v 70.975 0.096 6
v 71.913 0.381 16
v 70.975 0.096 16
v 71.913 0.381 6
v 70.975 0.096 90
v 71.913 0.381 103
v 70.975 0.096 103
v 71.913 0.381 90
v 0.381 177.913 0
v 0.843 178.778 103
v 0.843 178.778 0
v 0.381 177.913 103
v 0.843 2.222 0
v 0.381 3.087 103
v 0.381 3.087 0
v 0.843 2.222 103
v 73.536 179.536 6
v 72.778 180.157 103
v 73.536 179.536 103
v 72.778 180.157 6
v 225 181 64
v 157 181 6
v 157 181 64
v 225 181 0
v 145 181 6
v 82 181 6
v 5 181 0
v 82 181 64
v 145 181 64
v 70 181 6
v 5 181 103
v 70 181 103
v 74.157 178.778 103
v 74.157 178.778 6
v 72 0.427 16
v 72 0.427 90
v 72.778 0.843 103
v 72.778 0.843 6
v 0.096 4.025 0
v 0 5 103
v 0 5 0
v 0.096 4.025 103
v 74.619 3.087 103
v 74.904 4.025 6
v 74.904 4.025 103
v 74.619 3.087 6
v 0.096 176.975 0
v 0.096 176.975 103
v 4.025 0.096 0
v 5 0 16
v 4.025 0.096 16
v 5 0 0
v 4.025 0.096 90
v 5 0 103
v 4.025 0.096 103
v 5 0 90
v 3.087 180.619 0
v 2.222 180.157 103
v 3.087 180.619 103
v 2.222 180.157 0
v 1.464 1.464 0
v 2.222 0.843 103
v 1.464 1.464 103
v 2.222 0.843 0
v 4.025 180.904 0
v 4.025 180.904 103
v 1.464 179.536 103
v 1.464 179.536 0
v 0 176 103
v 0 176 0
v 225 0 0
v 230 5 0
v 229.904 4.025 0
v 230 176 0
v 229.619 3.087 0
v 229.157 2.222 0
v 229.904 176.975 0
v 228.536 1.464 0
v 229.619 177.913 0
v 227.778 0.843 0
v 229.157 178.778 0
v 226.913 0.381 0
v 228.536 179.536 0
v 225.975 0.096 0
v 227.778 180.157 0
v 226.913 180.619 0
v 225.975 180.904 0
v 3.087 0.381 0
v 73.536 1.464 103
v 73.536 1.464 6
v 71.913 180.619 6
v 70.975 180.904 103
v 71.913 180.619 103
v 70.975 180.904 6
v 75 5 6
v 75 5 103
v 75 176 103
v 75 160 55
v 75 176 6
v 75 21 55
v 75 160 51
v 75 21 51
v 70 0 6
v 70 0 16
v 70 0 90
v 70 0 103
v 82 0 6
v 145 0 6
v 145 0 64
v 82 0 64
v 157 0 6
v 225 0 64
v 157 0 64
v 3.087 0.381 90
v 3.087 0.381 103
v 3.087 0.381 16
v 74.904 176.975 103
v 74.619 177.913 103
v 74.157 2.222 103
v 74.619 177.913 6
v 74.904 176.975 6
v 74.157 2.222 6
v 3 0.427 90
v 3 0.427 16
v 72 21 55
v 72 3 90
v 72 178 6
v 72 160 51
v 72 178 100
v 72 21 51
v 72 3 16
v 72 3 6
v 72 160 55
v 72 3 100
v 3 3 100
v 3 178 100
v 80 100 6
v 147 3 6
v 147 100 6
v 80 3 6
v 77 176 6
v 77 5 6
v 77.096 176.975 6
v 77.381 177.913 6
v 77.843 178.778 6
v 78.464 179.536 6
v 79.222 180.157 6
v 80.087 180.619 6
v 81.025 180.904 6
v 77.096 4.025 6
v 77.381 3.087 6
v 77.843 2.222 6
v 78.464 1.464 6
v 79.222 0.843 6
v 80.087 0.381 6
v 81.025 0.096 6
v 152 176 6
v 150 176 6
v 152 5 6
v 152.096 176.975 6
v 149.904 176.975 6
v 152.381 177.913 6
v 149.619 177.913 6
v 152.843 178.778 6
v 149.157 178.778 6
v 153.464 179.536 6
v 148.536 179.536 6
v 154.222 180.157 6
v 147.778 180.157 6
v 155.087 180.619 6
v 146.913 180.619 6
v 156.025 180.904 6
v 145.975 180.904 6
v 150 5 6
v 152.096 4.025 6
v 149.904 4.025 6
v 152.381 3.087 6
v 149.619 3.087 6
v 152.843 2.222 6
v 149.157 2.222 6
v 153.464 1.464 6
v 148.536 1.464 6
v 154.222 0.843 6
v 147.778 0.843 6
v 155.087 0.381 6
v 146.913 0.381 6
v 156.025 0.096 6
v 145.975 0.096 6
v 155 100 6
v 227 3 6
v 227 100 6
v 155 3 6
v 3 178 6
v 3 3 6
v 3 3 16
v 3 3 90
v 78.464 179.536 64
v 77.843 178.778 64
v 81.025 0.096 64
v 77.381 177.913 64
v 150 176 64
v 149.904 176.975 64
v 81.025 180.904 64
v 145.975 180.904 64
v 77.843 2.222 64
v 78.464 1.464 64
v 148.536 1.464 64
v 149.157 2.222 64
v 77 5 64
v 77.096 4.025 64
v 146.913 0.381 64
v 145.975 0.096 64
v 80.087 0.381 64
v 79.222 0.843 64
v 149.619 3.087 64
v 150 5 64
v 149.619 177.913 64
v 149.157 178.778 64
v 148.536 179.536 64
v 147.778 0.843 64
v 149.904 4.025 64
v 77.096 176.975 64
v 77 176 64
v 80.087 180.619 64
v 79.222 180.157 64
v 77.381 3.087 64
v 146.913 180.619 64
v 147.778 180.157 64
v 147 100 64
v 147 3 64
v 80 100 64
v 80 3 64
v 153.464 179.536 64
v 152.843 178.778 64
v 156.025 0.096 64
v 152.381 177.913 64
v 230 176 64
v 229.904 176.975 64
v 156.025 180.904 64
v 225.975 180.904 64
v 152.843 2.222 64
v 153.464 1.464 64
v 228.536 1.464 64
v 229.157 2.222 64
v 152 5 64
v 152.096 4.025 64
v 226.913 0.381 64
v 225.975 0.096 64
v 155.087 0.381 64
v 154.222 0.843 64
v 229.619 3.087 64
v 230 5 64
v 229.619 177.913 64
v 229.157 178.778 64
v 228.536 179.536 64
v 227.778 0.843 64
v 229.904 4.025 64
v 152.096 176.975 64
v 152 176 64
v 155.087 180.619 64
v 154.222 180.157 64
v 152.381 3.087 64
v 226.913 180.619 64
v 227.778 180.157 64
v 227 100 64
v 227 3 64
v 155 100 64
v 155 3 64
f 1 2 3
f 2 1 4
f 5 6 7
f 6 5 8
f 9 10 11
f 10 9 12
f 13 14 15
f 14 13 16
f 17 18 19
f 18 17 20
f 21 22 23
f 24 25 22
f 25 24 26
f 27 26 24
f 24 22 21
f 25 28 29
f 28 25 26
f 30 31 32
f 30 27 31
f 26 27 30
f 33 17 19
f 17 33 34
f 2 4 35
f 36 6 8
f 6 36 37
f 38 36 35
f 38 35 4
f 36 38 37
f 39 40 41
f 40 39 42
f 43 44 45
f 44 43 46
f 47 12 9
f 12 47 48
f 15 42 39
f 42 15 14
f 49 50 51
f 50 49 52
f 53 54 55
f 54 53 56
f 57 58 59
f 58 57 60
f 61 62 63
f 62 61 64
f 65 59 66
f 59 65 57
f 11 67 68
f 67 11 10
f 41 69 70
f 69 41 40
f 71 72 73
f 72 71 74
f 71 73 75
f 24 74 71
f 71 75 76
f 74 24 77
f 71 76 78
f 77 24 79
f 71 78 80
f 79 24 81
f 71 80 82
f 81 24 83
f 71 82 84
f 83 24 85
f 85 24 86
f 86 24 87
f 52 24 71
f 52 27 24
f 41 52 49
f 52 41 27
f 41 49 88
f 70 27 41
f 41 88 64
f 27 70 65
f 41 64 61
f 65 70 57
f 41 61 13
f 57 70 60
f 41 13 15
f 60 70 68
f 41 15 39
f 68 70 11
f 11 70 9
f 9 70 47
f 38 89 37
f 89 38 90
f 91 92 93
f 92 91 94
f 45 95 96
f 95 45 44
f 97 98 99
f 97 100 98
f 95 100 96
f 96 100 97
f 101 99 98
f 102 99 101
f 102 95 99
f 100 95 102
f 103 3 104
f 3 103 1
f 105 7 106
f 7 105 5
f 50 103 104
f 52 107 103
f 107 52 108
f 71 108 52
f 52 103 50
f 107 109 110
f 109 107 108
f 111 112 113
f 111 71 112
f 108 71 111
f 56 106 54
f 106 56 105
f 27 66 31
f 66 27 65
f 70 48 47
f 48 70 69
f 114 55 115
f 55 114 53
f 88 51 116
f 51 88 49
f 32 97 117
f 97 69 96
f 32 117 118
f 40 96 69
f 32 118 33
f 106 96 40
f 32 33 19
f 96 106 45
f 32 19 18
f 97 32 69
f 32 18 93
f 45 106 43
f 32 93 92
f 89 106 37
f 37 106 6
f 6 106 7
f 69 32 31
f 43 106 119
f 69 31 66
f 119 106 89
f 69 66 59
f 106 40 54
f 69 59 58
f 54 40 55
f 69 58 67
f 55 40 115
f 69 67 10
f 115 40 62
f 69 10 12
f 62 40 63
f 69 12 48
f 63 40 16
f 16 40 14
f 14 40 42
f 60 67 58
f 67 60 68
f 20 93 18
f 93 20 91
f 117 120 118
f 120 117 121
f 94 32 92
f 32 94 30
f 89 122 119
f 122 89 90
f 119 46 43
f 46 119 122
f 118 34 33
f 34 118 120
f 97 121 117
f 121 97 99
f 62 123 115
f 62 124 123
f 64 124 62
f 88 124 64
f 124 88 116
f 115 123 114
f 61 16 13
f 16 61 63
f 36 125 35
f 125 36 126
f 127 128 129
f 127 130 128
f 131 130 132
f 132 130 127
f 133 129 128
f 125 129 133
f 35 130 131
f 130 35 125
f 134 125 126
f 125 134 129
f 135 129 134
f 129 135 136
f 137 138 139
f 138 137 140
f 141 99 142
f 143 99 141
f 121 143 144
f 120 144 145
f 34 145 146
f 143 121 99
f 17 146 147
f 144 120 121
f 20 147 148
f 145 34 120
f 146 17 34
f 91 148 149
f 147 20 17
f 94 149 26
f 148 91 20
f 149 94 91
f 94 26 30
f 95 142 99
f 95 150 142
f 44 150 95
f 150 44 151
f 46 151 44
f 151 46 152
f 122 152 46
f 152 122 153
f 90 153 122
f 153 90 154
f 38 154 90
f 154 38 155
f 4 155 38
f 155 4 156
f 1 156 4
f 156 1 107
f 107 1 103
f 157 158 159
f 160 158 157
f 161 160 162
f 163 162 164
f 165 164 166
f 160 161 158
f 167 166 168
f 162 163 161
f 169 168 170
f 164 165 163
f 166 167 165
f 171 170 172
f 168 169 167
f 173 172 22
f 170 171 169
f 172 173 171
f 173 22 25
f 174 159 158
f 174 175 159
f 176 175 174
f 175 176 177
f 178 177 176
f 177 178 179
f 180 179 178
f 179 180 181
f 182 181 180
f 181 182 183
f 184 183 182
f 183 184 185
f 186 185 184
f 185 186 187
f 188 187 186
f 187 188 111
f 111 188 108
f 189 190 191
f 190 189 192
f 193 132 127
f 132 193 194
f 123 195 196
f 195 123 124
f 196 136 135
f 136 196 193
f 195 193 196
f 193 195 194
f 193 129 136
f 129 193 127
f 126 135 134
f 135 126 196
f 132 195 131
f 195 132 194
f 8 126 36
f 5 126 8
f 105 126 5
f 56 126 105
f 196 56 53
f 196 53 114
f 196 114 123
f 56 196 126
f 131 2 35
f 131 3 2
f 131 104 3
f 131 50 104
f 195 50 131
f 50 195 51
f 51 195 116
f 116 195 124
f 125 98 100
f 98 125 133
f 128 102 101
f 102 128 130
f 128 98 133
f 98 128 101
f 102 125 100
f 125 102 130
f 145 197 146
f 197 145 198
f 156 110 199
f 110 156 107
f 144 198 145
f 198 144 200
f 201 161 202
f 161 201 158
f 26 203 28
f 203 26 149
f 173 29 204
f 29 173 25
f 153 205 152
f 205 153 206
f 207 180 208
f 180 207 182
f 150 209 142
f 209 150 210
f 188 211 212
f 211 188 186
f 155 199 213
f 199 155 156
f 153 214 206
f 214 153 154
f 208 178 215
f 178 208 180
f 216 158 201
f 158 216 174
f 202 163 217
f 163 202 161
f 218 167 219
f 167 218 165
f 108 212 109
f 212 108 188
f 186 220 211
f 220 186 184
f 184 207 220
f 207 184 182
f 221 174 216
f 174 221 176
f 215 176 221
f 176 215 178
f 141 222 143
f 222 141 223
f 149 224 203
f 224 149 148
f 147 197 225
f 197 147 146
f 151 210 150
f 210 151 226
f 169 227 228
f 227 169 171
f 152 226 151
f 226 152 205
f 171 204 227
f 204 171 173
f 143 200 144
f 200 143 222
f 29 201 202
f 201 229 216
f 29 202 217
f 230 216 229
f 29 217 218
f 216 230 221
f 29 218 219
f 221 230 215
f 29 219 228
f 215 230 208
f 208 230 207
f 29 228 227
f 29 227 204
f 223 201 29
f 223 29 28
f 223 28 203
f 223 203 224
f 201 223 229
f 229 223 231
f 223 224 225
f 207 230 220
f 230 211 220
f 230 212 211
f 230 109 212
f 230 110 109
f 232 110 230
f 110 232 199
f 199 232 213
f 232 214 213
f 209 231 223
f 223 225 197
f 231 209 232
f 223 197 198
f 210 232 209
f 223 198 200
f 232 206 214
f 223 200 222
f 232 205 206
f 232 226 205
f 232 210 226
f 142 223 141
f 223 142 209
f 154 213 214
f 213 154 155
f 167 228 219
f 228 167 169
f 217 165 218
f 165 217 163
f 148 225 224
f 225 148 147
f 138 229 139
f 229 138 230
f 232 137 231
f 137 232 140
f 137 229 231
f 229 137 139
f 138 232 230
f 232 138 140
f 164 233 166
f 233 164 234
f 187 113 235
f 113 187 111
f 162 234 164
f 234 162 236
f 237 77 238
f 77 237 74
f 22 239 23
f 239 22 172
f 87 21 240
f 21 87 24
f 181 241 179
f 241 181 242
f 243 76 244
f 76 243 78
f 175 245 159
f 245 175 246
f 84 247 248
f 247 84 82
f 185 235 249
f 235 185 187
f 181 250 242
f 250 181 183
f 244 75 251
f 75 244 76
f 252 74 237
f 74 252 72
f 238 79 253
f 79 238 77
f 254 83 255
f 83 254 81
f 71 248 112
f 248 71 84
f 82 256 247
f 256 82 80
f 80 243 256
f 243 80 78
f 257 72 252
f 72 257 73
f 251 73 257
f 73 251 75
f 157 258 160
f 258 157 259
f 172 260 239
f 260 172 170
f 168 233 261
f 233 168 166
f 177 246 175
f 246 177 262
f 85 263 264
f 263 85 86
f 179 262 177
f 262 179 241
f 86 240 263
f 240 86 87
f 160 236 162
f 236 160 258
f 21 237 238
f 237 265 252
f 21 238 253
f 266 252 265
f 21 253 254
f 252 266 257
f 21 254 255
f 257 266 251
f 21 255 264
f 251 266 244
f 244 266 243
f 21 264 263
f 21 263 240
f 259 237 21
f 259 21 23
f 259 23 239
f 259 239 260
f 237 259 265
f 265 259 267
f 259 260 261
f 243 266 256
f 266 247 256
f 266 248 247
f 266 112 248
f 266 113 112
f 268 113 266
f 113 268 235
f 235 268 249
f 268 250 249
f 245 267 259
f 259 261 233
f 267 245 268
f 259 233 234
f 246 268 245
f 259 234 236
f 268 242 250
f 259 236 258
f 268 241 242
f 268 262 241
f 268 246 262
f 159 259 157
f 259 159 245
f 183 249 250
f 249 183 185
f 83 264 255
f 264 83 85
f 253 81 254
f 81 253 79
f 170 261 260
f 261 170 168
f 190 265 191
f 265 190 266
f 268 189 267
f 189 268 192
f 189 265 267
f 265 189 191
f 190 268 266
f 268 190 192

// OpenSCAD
// PrimeBind Station — Pack Opening Desk Organizer v1
// Sections (left→right): Toploader Spring Magazine | Exact Fit Sleeves | Regular Sleeves
//
// KEY FEATURE: Spring-loaded toploader magazine — follower plate keeps stack
// pressed forward at all times. Grab from front, spring advances stack.
// Follower slot visible on right wall — handle travels as stack is consumed.
//
// DIMS: ~230mm wide × 181mm deep × 103mm tall
// PRINT: Standing upright on the base (floor on bed)
// FITS: K2 Plus 350×350mm bed in one piece

$fn = 32;

// ─── SHARED ────────────────────────────────────────────────────
wall    = 3.0;
r_edge  = 5.0;
base_h  = 6.0;
sep     = 2.0;   // gap between sections (modular aesthetic)

// ─── TOPLOADER MAGAZINE ────────────────────────────────────────
// Standard 35pt rigid toploader: 66×91mm face, ~3.2mm thick
tl_w    = 66.0;
tl_h    = 91.0;
tl_t    = 3.2;
tl_n    = 50;

mag_iw  = tl_w + 3.0;          // 69mm inner W (1.5mm clearance per side)
mag_ih  = tl_h + 3.0;          // 94mm inner H
mag_id  = tl_n * tl_t + 15;    // 175mm inner D (160mm stack + 15mm spring space)
mag_ow  = mag_iw + wall * 2;   // 75mm outer W
mag_oh  = mag_ih + wall;        // 97mm height above base (base is floor, wall is ceiling)
mag_od  = mag_id + wall * 2;   // 181mm outer D

front_lip = 10.0;   // retaining lip at top+bottom of front opening

// Spring follower slot — horizontal groove in right wall
// follower handle rides in this slot, visible from outside
fol_h      = 4.0;    // slot height
fol_margin = 18.0;   // closed ends (keeps slot from reaching corners)

// ─── SLEEVE WELLS ─────────────────────────────────────────────
// Standard sleeve depth (all formats fit within 95mm)
sl_id   = 97.0;   // inner cavity depth

// Exact fit sleeves (Dragon Shield PF, KMC Perfect Fit): 64×89mm
// 200 sleeves ≈ 10mm thick — well sized for 400+
ef_iw   = 67.0;
ef_ih   = 55.0;
ef_ow   = ef_iw + wall * 2;   // 73mm
ef_oh   = ef_ih + wall;        // 58mm height above base

// Regular sleeves (Dragon Shield, Ultra Pro Matte): 67×93mm
// 200 sleeves ≈ 18mm thick — well sized for 300+
reg_iw  = 72.0;
reg_ih  = 55.0;
reg_ow  = reg_iw + wall * 2;  // 78mm
reg_oh  = reg_ih + wall;       // 58mm height above base

// ─── LAYOUT ───────────────────────────────────────────────────
x_mag   = 0;
x_ef    = x_mag + mag_ow + sep;          // 77mm
x_reg   = x_ef  + ef_ow  + sep;         // 152mm
total_w = x_reg + reg_ow;               // 230mm

// ─── HELPER ───────────────────────────────────────────────────
module rbox(x, y, z, r) {
    hull() {
        for (xi = [r, x-r]) for (yi = [r, y-r])
            translate([xi, yi, 0]) cylinder(r=r, h=z);
    }
}

// ─── BASE PLATE ────────────────────────────────────────────────
// Unified floor across all sections — visual anchor of the station
module base_plate() {
    rbox(total_w, mag_od, base_h, r_edge);
}

// ─── TOPLOADER MAGAZINE ────────────────────────────────────────
module magazine() {
    translate([x_mag, 0, 0])
        difference() {
            // outer shell — tallest section, visual focal point
            rbox(mag_ow, mag_od, base_h + mag_oh, r_edge);

            // interior cavity — toploaders stand upright and stack front→back
            translate([wall, wall, base_h])
                cube([mag_iw, mag_id, mag_ih]);

            // front opening — shows toploader face through center
            // top+bottom lips retain the stack in place
            translate([wall, -1, base_h + front_lip])
                cube([mag_iw, wall + 2, mag_ih - front_lip * 2]);

            // follower slot — horizontal groove in right wall
            // spring follower handle protrudes here and slides as stack shrinks
            translate([mag_ow - wall - 0.01, wall + fol_margin, base_h + mag_ih/2 - fol_h/2])
                cube([wall + 1, mag_id - fol_margin * 2, fol_h]);
        }
}

// ─── SLEEVE WELL ───────────────────────────────────────────────
module sleeve_well(x_pos, iw, ih, oh) {
    ow = iw + wall * 2;
    translate([x_pos, 0, 0])
        difference() {
            // outer shell — shorter than magazine for visual hierarchy
            rbox(ow, mag_od, base_h + oh, r_edge);

            // open-top cavity — front sl_id portion is the sleeve zone
            // back portion is solid (structural + future utility compartment)
            translate([wall, wall, base_h])
                cube([iw, sl_id, ih + wall + 1]);
        }
}

// ─── STATION ───────────────────────────────────────────────────
module station() {
    color("white") union() {
        base_plate();
        magazine();
        sleeve_well(x_ef,  ef_iw,  ef_ih,  ef_oh);
        sleeve_well(x_reg, reg_iw, reg_ih, reg_oh);
    }
}

station();
